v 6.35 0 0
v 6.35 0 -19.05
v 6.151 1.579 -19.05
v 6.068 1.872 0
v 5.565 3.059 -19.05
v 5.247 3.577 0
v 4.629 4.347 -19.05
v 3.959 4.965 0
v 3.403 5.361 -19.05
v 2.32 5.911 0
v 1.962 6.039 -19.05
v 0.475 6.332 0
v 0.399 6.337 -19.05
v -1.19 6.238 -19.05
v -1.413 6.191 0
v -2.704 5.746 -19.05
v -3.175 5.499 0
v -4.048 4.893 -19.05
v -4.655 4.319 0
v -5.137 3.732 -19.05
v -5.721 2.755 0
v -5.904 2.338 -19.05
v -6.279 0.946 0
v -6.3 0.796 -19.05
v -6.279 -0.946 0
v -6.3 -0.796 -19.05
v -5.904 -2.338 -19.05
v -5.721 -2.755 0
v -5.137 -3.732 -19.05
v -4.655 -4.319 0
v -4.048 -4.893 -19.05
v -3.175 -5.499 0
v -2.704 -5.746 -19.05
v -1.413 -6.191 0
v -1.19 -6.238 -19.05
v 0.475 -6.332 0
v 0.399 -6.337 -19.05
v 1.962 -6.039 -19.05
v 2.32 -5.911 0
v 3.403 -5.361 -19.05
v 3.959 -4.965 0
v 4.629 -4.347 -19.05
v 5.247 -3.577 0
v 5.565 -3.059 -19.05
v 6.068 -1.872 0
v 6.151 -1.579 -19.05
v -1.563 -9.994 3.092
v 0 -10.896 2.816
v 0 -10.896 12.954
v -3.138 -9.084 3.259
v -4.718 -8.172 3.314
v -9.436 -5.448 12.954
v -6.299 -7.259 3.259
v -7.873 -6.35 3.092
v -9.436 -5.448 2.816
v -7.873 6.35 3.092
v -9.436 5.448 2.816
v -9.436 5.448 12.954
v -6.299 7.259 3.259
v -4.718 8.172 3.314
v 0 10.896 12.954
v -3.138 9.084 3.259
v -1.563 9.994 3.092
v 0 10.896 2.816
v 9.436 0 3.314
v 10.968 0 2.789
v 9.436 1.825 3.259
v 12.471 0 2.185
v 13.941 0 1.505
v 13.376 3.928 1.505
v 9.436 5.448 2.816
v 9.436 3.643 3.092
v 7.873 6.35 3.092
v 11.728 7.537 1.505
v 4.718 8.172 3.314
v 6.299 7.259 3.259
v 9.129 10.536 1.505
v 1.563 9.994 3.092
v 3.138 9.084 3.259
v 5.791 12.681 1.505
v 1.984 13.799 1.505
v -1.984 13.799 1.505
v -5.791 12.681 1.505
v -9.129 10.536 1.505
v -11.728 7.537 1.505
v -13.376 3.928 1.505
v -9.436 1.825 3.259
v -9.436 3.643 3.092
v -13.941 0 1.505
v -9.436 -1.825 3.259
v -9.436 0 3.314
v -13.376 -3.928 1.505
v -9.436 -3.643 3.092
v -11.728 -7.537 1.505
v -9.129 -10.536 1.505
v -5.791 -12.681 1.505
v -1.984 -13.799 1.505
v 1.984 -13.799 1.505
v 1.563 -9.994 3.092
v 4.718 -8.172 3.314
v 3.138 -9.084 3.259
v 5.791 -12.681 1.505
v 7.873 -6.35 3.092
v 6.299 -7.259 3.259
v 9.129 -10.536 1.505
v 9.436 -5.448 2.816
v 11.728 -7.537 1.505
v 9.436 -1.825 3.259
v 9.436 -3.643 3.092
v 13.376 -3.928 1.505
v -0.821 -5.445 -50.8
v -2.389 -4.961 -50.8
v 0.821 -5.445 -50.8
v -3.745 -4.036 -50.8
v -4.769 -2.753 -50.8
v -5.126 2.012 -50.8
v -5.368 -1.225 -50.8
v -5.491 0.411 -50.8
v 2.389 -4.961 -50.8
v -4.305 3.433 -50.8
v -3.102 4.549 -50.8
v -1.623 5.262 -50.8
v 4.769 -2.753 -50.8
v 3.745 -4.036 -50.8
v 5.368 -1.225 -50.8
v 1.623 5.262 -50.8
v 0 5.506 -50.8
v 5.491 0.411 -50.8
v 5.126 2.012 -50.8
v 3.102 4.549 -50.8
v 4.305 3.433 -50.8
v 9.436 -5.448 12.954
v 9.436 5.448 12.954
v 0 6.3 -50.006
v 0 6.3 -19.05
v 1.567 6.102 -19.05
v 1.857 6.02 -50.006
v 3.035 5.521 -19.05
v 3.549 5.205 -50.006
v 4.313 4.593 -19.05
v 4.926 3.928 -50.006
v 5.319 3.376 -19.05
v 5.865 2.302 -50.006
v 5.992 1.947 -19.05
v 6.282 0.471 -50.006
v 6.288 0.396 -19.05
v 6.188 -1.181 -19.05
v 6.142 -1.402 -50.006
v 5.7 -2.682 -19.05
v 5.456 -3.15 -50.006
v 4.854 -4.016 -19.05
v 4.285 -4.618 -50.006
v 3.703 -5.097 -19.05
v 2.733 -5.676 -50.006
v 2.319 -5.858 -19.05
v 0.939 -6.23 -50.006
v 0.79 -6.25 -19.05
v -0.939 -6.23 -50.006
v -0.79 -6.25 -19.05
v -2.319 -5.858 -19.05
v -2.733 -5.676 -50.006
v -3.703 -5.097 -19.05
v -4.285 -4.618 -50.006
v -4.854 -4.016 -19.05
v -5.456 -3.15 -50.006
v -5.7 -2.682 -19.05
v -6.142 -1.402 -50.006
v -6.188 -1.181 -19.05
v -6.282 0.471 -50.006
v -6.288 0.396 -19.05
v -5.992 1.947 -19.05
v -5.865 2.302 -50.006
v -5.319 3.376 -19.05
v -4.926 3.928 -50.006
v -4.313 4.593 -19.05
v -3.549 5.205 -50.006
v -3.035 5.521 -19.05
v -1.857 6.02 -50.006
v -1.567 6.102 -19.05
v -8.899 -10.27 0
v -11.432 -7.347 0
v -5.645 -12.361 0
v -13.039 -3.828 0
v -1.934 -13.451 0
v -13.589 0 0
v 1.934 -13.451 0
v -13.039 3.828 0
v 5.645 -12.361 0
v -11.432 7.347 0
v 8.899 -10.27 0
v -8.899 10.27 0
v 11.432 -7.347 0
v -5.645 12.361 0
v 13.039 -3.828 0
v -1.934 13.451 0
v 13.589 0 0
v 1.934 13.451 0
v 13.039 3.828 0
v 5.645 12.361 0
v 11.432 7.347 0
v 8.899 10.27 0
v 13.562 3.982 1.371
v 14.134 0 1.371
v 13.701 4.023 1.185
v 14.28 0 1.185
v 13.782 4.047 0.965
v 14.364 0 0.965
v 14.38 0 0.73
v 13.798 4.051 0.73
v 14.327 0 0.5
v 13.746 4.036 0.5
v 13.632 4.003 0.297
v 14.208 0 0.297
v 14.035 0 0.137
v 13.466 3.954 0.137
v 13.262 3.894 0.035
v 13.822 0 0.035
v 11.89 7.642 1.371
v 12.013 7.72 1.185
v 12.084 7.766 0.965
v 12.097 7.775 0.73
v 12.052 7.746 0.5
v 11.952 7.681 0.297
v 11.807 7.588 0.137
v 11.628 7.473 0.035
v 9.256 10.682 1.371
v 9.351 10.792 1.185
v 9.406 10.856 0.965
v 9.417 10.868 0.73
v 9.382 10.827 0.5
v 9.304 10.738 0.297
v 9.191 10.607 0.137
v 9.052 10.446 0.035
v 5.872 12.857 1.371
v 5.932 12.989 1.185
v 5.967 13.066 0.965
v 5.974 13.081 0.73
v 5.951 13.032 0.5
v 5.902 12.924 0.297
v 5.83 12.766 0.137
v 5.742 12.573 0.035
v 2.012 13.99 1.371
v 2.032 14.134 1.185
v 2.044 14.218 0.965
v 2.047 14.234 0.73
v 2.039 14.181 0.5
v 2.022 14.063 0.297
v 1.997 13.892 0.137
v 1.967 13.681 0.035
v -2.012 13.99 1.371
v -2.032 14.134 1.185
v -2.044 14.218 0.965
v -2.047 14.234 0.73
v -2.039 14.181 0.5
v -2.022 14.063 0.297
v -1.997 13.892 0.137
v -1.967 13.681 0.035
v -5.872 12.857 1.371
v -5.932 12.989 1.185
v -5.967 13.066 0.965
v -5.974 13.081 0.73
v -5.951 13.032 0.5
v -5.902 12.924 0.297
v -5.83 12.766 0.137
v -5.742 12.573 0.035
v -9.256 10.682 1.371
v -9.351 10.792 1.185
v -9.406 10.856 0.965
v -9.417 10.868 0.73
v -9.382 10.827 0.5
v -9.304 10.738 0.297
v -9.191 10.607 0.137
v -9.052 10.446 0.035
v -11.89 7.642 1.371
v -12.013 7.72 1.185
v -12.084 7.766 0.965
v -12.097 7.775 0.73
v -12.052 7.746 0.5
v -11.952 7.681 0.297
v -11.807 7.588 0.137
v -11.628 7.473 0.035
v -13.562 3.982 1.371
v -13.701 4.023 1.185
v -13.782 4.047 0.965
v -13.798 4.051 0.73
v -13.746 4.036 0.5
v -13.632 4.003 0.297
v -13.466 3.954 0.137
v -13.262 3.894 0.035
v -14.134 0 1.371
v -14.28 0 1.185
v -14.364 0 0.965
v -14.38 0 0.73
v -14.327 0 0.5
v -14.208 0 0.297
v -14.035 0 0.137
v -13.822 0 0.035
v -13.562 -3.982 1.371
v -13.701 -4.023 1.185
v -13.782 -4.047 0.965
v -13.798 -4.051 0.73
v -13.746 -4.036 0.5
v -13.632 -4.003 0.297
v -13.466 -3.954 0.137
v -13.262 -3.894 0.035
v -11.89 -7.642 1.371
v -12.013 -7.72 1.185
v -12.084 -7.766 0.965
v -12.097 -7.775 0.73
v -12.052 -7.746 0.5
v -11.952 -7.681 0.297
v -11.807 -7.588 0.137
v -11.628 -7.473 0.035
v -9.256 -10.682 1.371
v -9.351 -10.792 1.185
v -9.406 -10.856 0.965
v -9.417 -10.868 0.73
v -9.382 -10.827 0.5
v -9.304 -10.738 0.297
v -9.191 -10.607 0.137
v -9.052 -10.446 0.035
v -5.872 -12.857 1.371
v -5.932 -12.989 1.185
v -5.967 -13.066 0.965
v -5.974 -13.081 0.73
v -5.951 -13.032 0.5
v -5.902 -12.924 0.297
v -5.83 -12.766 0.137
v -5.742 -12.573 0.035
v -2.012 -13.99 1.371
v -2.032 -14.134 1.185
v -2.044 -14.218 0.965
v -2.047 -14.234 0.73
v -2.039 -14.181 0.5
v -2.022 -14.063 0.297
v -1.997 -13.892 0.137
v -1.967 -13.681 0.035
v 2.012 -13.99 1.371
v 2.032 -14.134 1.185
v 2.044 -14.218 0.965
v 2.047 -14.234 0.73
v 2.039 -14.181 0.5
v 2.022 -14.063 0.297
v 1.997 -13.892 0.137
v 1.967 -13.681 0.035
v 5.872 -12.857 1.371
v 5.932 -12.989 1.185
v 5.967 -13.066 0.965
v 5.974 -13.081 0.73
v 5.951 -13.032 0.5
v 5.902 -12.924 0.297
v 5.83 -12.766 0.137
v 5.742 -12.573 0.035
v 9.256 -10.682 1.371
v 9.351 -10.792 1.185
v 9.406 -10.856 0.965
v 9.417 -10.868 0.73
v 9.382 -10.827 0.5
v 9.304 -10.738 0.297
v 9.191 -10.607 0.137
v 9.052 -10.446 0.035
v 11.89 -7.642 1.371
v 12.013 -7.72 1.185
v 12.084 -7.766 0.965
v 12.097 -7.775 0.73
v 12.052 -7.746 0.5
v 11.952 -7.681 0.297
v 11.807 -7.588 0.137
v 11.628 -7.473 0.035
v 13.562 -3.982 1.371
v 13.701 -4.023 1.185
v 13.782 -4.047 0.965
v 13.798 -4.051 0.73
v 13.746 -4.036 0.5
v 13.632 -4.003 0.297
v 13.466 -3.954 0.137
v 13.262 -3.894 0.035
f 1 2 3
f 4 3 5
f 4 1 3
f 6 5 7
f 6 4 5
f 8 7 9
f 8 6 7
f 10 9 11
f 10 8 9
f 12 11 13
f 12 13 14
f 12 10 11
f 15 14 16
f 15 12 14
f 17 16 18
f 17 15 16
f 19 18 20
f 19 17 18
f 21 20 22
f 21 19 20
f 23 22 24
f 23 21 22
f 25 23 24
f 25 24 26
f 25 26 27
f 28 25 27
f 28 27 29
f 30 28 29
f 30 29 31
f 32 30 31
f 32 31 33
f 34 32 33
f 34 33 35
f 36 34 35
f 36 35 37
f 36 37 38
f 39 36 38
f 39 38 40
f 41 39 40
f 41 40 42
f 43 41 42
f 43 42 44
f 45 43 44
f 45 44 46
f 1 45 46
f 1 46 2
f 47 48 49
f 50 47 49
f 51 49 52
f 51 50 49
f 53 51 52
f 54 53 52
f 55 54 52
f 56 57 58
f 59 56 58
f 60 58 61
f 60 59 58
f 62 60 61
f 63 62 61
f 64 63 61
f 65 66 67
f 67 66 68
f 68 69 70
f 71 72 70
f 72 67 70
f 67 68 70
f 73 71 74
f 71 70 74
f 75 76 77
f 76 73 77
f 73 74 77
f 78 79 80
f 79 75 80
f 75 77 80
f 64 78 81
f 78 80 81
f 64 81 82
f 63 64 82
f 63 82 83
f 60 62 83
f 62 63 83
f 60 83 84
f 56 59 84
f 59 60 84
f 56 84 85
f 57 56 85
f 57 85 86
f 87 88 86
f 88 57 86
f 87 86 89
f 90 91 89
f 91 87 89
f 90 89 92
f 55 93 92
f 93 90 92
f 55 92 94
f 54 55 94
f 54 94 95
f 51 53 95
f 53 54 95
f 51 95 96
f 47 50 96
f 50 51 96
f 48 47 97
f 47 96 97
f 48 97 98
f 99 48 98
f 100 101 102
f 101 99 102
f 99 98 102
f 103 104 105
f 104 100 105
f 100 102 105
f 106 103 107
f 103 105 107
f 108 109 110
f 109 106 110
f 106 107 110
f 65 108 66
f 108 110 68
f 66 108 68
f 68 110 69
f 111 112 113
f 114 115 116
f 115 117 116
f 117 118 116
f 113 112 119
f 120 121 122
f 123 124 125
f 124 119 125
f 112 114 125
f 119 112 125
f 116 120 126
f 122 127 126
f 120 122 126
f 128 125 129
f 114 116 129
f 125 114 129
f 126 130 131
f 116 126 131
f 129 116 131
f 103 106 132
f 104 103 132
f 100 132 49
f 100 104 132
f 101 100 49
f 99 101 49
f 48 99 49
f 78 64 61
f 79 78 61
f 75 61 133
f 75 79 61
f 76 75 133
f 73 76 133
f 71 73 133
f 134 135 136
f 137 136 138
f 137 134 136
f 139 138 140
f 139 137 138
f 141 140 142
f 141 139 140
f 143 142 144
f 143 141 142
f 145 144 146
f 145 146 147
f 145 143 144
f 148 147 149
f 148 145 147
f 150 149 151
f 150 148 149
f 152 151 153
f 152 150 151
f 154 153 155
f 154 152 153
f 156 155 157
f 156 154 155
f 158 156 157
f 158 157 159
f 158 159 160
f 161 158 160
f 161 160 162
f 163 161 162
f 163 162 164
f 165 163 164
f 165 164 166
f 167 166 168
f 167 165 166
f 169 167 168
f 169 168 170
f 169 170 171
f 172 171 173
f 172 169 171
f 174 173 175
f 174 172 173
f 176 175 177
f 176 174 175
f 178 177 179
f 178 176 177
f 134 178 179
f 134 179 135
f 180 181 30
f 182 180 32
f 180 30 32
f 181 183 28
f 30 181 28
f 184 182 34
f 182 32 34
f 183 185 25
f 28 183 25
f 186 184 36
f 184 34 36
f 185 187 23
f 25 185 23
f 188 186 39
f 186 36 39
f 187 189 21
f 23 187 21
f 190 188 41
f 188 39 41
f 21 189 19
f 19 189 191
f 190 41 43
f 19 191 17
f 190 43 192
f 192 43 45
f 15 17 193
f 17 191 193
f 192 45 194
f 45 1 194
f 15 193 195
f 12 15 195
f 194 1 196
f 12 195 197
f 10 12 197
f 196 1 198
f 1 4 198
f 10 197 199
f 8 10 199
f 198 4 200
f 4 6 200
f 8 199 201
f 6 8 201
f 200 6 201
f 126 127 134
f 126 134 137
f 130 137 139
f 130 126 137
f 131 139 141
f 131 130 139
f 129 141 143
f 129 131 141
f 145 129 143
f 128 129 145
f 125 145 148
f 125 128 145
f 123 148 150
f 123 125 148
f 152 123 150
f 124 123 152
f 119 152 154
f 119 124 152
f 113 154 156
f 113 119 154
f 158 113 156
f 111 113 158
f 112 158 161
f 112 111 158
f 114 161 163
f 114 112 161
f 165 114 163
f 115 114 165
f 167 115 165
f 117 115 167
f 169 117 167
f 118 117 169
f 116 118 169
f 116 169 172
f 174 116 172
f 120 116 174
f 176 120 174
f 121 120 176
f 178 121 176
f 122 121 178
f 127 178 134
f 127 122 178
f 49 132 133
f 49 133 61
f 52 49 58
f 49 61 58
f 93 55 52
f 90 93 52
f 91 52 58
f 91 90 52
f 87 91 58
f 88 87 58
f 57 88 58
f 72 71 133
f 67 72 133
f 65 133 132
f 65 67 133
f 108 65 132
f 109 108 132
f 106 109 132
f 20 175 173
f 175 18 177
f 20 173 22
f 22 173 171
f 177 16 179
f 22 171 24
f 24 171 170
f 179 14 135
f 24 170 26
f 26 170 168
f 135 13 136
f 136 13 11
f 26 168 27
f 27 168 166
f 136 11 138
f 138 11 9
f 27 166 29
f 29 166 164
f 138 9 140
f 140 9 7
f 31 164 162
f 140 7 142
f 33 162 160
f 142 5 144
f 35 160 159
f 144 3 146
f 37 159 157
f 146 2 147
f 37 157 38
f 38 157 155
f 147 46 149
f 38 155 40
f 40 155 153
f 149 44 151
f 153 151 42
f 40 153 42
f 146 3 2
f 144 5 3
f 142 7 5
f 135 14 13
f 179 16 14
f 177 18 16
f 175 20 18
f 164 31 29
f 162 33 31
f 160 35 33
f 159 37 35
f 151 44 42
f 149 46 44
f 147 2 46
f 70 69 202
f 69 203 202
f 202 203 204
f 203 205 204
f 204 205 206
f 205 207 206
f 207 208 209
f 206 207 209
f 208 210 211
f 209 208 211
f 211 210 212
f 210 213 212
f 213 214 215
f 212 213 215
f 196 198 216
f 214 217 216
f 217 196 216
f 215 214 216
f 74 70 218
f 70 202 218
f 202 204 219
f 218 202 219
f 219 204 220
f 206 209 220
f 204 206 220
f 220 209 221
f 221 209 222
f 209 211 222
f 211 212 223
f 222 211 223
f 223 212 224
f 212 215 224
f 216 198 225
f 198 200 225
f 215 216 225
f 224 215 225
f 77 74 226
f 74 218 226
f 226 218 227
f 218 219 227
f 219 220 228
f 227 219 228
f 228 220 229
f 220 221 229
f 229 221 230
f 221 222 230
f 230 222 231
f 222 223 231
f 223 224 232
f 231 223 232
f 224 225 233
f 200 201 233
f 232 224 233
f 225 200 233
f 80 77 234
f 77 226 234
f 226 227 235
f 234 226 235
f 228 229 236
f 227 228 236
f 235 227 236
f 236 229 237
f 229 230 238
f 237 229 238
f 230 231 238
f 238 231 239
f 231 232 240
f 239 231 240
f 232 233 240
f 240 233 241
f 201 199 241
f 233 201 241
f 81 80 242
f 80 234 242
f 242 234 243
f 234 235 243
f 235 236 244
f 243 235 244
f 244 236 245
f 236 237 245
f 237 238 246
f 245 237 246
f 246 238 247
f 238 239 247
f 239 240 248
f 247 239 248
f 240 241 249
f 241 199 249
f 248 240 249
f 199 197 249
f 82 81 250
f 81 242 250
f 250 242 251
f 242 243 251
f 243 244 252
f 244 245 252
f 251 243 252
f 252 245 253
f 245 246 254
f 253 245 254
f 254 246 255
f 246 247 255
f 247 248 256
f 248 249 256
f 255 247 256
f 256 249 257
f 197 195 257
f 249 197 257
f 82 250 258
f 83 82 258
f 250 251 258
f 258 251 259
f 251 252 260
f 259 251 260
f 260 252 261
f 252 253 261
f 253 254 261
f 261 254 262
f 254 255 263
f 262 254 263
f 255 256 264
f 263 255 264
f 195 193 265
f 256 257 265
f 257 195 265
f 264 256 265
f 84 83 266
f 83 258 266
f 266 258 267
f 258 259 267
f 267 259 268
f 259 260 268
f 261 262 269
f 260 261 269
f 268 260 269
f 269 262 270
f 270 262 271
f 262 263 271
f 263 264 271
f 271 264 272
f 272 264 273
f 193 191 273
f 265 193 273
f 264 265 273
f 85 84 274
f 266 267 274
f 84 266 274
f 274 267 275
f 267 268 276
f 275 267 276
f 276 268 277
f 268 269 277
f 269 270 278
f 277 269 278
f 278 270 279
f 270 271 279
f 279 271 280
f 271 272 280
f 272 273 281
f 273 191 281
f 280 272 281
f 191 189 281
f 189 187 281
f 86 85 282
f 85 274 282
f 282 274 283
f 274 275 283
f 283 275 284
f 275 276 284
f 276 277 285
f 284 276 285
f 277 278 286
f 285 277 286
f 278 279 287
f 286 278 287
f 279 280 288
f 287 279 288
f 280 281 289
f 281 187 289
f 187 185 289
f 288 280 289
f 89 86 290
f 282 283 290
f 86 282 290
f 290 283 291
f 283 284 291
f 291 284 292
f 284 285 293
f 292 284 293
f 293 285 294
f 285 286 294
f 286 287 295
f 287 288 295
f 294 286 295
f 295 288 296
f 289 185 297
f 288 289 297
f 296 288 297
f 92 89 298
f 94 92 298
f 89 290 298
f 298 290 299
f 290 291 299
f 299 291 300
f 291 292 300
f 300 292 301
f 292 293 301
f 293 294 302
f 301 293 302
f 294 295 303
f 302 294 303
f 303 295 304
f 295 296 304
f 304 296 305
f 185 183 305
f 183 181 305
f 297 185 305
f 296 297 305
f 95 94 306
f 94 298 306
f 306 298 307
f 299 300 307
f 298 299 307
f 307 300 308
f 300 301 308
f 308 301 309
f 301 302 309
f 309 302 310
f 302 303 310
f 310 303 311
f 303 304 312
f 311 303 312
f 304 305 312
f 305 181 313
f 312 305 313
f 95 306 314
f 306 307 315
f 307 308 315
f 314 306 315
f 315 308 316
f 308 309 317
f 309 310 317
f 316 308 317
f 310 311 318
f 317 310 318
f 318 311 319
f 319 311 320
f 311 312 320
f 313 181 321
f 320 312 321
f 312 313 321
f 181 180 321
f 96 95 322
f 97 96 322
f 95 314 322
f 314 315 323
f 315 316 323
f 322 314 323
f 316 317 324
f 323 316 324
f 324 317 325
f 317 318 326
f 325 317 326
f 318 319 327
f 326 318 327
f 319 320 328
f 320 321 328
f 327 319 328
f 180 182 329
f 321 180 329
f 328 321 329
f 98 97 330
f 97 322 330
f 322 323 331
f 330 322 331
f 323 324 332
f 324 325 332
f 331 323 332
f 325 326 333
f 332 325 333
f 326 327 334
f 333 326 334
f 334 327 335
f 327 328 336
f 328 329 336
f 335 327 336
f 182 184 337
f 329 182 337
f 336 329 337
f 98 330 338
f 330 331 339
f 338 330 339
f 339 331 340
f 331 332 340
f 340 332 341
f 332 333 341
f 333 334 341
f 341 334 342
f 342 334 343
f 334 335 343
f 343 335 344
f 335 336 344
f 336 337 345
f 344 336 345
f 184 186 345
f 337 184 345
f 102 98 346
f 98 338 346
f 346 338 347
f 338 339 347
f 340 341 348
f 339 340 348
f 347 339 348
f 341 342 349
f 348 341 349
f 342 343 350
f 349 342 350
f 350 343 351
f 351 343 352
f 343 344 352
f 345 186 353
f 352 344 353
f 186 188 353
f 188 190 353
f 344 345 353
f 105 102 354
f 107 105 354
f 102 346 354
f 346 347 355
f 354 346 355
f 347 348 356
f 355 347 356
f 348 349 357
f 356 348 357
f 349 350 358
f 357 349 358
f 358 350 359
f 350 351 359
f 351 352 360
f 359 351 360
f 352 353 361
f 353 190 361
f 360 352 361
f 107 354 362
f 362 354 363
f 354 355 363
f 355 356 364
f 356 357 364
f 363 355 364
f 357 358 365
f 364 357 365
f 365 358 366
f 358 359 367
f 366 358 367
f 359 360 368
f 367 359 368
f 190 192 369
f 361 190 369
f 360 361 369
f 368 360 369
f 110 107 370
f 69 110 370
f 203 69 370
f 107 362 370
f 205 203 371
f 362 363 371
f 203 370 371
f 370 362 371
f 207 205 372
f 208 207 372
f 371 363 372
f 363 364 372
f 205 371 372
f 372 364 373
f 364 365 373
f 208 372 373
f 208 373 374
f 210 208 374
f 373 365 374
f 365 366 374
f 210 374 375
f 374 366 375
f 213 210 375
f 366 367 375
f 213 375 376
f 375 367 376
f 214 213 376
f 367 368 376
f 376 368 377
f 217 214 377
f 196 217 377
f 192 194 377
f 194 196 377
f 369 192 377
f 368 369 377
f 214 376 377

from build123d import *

# Parameters (mm, degrees)
HEAD_DEPTH     = 12.954
SHANK_SKETCH_R = 6.35
SHANK_DEPTH    = 50.8
THREAD_END_W   = 31.75
THREAD_END_H   = 0.05
CHAMFER1_SIZE  = 0.79375


with BuildPart() as part:
    # Head Sketch → Head (new body)
    with BuildSketch(Plane.XY):
        Polygon((0, 10.89586975), (9.4361, 5.447934875), (9.4361, -5.447934875), (0, -10.89586975), (-9.4361, -5.447934875), (-9.4361, 5.447934875), align=None)
    extrude(amount=HEAD_DEPTH)

    # Shank Sketch → Shank (add)
    with BuildSketch(Plane.XY):
        Circle(SHANK_SKETCH_R)
    extrude(amount=-SHANK_DEPTH)

    # Sketch3 → Flange (revolve)
    with BuildSketch(Plane(origin=(0, 0, 0), x_dir=(-1, 0, 0), z_dir=(0, 1, 0))):
        with BuildLine():
            Line((-13.589, 0), (0, 0))
            Line((0, 0), (0, 4.7625))
            ThreePointArc((0, 4.7625), (-7.158083275, 3.937386416), (-13.940711322, 1.505324458))
            ThreePointArc((-13.940711322, 1.505324458), (-14.361933143, 0.613158144), (-13.589, 0))
        make_face()
    revolve(axis=Axis((0, 0, 0), (0, 0, 1)))

    # Thread End → Thread Cut (revolve, cut)
    with BuildSketch(Plane(origin=(0, 0, 0), x_dir=(0, 0, -1), z_dir=(1, 0, 0))):
        with Locations((34.925, 6.325)):
            Rectangle(THREAD_END_W, THREAD_END_H)
    revolve(axis=Axis((0, 0, -21.551935625), (0, 0, -1)), mode=Mode.SUBTRACT)

    # Chamfer1
    chamfer1_edges = [part.edges().sort_by_distance(p)[0] for p in [
        (0, -6.3, -50.8),
    ]]
    chamfer(chamfer1_edges, length=CHAMFER1_SIZE)


solid = part.part
